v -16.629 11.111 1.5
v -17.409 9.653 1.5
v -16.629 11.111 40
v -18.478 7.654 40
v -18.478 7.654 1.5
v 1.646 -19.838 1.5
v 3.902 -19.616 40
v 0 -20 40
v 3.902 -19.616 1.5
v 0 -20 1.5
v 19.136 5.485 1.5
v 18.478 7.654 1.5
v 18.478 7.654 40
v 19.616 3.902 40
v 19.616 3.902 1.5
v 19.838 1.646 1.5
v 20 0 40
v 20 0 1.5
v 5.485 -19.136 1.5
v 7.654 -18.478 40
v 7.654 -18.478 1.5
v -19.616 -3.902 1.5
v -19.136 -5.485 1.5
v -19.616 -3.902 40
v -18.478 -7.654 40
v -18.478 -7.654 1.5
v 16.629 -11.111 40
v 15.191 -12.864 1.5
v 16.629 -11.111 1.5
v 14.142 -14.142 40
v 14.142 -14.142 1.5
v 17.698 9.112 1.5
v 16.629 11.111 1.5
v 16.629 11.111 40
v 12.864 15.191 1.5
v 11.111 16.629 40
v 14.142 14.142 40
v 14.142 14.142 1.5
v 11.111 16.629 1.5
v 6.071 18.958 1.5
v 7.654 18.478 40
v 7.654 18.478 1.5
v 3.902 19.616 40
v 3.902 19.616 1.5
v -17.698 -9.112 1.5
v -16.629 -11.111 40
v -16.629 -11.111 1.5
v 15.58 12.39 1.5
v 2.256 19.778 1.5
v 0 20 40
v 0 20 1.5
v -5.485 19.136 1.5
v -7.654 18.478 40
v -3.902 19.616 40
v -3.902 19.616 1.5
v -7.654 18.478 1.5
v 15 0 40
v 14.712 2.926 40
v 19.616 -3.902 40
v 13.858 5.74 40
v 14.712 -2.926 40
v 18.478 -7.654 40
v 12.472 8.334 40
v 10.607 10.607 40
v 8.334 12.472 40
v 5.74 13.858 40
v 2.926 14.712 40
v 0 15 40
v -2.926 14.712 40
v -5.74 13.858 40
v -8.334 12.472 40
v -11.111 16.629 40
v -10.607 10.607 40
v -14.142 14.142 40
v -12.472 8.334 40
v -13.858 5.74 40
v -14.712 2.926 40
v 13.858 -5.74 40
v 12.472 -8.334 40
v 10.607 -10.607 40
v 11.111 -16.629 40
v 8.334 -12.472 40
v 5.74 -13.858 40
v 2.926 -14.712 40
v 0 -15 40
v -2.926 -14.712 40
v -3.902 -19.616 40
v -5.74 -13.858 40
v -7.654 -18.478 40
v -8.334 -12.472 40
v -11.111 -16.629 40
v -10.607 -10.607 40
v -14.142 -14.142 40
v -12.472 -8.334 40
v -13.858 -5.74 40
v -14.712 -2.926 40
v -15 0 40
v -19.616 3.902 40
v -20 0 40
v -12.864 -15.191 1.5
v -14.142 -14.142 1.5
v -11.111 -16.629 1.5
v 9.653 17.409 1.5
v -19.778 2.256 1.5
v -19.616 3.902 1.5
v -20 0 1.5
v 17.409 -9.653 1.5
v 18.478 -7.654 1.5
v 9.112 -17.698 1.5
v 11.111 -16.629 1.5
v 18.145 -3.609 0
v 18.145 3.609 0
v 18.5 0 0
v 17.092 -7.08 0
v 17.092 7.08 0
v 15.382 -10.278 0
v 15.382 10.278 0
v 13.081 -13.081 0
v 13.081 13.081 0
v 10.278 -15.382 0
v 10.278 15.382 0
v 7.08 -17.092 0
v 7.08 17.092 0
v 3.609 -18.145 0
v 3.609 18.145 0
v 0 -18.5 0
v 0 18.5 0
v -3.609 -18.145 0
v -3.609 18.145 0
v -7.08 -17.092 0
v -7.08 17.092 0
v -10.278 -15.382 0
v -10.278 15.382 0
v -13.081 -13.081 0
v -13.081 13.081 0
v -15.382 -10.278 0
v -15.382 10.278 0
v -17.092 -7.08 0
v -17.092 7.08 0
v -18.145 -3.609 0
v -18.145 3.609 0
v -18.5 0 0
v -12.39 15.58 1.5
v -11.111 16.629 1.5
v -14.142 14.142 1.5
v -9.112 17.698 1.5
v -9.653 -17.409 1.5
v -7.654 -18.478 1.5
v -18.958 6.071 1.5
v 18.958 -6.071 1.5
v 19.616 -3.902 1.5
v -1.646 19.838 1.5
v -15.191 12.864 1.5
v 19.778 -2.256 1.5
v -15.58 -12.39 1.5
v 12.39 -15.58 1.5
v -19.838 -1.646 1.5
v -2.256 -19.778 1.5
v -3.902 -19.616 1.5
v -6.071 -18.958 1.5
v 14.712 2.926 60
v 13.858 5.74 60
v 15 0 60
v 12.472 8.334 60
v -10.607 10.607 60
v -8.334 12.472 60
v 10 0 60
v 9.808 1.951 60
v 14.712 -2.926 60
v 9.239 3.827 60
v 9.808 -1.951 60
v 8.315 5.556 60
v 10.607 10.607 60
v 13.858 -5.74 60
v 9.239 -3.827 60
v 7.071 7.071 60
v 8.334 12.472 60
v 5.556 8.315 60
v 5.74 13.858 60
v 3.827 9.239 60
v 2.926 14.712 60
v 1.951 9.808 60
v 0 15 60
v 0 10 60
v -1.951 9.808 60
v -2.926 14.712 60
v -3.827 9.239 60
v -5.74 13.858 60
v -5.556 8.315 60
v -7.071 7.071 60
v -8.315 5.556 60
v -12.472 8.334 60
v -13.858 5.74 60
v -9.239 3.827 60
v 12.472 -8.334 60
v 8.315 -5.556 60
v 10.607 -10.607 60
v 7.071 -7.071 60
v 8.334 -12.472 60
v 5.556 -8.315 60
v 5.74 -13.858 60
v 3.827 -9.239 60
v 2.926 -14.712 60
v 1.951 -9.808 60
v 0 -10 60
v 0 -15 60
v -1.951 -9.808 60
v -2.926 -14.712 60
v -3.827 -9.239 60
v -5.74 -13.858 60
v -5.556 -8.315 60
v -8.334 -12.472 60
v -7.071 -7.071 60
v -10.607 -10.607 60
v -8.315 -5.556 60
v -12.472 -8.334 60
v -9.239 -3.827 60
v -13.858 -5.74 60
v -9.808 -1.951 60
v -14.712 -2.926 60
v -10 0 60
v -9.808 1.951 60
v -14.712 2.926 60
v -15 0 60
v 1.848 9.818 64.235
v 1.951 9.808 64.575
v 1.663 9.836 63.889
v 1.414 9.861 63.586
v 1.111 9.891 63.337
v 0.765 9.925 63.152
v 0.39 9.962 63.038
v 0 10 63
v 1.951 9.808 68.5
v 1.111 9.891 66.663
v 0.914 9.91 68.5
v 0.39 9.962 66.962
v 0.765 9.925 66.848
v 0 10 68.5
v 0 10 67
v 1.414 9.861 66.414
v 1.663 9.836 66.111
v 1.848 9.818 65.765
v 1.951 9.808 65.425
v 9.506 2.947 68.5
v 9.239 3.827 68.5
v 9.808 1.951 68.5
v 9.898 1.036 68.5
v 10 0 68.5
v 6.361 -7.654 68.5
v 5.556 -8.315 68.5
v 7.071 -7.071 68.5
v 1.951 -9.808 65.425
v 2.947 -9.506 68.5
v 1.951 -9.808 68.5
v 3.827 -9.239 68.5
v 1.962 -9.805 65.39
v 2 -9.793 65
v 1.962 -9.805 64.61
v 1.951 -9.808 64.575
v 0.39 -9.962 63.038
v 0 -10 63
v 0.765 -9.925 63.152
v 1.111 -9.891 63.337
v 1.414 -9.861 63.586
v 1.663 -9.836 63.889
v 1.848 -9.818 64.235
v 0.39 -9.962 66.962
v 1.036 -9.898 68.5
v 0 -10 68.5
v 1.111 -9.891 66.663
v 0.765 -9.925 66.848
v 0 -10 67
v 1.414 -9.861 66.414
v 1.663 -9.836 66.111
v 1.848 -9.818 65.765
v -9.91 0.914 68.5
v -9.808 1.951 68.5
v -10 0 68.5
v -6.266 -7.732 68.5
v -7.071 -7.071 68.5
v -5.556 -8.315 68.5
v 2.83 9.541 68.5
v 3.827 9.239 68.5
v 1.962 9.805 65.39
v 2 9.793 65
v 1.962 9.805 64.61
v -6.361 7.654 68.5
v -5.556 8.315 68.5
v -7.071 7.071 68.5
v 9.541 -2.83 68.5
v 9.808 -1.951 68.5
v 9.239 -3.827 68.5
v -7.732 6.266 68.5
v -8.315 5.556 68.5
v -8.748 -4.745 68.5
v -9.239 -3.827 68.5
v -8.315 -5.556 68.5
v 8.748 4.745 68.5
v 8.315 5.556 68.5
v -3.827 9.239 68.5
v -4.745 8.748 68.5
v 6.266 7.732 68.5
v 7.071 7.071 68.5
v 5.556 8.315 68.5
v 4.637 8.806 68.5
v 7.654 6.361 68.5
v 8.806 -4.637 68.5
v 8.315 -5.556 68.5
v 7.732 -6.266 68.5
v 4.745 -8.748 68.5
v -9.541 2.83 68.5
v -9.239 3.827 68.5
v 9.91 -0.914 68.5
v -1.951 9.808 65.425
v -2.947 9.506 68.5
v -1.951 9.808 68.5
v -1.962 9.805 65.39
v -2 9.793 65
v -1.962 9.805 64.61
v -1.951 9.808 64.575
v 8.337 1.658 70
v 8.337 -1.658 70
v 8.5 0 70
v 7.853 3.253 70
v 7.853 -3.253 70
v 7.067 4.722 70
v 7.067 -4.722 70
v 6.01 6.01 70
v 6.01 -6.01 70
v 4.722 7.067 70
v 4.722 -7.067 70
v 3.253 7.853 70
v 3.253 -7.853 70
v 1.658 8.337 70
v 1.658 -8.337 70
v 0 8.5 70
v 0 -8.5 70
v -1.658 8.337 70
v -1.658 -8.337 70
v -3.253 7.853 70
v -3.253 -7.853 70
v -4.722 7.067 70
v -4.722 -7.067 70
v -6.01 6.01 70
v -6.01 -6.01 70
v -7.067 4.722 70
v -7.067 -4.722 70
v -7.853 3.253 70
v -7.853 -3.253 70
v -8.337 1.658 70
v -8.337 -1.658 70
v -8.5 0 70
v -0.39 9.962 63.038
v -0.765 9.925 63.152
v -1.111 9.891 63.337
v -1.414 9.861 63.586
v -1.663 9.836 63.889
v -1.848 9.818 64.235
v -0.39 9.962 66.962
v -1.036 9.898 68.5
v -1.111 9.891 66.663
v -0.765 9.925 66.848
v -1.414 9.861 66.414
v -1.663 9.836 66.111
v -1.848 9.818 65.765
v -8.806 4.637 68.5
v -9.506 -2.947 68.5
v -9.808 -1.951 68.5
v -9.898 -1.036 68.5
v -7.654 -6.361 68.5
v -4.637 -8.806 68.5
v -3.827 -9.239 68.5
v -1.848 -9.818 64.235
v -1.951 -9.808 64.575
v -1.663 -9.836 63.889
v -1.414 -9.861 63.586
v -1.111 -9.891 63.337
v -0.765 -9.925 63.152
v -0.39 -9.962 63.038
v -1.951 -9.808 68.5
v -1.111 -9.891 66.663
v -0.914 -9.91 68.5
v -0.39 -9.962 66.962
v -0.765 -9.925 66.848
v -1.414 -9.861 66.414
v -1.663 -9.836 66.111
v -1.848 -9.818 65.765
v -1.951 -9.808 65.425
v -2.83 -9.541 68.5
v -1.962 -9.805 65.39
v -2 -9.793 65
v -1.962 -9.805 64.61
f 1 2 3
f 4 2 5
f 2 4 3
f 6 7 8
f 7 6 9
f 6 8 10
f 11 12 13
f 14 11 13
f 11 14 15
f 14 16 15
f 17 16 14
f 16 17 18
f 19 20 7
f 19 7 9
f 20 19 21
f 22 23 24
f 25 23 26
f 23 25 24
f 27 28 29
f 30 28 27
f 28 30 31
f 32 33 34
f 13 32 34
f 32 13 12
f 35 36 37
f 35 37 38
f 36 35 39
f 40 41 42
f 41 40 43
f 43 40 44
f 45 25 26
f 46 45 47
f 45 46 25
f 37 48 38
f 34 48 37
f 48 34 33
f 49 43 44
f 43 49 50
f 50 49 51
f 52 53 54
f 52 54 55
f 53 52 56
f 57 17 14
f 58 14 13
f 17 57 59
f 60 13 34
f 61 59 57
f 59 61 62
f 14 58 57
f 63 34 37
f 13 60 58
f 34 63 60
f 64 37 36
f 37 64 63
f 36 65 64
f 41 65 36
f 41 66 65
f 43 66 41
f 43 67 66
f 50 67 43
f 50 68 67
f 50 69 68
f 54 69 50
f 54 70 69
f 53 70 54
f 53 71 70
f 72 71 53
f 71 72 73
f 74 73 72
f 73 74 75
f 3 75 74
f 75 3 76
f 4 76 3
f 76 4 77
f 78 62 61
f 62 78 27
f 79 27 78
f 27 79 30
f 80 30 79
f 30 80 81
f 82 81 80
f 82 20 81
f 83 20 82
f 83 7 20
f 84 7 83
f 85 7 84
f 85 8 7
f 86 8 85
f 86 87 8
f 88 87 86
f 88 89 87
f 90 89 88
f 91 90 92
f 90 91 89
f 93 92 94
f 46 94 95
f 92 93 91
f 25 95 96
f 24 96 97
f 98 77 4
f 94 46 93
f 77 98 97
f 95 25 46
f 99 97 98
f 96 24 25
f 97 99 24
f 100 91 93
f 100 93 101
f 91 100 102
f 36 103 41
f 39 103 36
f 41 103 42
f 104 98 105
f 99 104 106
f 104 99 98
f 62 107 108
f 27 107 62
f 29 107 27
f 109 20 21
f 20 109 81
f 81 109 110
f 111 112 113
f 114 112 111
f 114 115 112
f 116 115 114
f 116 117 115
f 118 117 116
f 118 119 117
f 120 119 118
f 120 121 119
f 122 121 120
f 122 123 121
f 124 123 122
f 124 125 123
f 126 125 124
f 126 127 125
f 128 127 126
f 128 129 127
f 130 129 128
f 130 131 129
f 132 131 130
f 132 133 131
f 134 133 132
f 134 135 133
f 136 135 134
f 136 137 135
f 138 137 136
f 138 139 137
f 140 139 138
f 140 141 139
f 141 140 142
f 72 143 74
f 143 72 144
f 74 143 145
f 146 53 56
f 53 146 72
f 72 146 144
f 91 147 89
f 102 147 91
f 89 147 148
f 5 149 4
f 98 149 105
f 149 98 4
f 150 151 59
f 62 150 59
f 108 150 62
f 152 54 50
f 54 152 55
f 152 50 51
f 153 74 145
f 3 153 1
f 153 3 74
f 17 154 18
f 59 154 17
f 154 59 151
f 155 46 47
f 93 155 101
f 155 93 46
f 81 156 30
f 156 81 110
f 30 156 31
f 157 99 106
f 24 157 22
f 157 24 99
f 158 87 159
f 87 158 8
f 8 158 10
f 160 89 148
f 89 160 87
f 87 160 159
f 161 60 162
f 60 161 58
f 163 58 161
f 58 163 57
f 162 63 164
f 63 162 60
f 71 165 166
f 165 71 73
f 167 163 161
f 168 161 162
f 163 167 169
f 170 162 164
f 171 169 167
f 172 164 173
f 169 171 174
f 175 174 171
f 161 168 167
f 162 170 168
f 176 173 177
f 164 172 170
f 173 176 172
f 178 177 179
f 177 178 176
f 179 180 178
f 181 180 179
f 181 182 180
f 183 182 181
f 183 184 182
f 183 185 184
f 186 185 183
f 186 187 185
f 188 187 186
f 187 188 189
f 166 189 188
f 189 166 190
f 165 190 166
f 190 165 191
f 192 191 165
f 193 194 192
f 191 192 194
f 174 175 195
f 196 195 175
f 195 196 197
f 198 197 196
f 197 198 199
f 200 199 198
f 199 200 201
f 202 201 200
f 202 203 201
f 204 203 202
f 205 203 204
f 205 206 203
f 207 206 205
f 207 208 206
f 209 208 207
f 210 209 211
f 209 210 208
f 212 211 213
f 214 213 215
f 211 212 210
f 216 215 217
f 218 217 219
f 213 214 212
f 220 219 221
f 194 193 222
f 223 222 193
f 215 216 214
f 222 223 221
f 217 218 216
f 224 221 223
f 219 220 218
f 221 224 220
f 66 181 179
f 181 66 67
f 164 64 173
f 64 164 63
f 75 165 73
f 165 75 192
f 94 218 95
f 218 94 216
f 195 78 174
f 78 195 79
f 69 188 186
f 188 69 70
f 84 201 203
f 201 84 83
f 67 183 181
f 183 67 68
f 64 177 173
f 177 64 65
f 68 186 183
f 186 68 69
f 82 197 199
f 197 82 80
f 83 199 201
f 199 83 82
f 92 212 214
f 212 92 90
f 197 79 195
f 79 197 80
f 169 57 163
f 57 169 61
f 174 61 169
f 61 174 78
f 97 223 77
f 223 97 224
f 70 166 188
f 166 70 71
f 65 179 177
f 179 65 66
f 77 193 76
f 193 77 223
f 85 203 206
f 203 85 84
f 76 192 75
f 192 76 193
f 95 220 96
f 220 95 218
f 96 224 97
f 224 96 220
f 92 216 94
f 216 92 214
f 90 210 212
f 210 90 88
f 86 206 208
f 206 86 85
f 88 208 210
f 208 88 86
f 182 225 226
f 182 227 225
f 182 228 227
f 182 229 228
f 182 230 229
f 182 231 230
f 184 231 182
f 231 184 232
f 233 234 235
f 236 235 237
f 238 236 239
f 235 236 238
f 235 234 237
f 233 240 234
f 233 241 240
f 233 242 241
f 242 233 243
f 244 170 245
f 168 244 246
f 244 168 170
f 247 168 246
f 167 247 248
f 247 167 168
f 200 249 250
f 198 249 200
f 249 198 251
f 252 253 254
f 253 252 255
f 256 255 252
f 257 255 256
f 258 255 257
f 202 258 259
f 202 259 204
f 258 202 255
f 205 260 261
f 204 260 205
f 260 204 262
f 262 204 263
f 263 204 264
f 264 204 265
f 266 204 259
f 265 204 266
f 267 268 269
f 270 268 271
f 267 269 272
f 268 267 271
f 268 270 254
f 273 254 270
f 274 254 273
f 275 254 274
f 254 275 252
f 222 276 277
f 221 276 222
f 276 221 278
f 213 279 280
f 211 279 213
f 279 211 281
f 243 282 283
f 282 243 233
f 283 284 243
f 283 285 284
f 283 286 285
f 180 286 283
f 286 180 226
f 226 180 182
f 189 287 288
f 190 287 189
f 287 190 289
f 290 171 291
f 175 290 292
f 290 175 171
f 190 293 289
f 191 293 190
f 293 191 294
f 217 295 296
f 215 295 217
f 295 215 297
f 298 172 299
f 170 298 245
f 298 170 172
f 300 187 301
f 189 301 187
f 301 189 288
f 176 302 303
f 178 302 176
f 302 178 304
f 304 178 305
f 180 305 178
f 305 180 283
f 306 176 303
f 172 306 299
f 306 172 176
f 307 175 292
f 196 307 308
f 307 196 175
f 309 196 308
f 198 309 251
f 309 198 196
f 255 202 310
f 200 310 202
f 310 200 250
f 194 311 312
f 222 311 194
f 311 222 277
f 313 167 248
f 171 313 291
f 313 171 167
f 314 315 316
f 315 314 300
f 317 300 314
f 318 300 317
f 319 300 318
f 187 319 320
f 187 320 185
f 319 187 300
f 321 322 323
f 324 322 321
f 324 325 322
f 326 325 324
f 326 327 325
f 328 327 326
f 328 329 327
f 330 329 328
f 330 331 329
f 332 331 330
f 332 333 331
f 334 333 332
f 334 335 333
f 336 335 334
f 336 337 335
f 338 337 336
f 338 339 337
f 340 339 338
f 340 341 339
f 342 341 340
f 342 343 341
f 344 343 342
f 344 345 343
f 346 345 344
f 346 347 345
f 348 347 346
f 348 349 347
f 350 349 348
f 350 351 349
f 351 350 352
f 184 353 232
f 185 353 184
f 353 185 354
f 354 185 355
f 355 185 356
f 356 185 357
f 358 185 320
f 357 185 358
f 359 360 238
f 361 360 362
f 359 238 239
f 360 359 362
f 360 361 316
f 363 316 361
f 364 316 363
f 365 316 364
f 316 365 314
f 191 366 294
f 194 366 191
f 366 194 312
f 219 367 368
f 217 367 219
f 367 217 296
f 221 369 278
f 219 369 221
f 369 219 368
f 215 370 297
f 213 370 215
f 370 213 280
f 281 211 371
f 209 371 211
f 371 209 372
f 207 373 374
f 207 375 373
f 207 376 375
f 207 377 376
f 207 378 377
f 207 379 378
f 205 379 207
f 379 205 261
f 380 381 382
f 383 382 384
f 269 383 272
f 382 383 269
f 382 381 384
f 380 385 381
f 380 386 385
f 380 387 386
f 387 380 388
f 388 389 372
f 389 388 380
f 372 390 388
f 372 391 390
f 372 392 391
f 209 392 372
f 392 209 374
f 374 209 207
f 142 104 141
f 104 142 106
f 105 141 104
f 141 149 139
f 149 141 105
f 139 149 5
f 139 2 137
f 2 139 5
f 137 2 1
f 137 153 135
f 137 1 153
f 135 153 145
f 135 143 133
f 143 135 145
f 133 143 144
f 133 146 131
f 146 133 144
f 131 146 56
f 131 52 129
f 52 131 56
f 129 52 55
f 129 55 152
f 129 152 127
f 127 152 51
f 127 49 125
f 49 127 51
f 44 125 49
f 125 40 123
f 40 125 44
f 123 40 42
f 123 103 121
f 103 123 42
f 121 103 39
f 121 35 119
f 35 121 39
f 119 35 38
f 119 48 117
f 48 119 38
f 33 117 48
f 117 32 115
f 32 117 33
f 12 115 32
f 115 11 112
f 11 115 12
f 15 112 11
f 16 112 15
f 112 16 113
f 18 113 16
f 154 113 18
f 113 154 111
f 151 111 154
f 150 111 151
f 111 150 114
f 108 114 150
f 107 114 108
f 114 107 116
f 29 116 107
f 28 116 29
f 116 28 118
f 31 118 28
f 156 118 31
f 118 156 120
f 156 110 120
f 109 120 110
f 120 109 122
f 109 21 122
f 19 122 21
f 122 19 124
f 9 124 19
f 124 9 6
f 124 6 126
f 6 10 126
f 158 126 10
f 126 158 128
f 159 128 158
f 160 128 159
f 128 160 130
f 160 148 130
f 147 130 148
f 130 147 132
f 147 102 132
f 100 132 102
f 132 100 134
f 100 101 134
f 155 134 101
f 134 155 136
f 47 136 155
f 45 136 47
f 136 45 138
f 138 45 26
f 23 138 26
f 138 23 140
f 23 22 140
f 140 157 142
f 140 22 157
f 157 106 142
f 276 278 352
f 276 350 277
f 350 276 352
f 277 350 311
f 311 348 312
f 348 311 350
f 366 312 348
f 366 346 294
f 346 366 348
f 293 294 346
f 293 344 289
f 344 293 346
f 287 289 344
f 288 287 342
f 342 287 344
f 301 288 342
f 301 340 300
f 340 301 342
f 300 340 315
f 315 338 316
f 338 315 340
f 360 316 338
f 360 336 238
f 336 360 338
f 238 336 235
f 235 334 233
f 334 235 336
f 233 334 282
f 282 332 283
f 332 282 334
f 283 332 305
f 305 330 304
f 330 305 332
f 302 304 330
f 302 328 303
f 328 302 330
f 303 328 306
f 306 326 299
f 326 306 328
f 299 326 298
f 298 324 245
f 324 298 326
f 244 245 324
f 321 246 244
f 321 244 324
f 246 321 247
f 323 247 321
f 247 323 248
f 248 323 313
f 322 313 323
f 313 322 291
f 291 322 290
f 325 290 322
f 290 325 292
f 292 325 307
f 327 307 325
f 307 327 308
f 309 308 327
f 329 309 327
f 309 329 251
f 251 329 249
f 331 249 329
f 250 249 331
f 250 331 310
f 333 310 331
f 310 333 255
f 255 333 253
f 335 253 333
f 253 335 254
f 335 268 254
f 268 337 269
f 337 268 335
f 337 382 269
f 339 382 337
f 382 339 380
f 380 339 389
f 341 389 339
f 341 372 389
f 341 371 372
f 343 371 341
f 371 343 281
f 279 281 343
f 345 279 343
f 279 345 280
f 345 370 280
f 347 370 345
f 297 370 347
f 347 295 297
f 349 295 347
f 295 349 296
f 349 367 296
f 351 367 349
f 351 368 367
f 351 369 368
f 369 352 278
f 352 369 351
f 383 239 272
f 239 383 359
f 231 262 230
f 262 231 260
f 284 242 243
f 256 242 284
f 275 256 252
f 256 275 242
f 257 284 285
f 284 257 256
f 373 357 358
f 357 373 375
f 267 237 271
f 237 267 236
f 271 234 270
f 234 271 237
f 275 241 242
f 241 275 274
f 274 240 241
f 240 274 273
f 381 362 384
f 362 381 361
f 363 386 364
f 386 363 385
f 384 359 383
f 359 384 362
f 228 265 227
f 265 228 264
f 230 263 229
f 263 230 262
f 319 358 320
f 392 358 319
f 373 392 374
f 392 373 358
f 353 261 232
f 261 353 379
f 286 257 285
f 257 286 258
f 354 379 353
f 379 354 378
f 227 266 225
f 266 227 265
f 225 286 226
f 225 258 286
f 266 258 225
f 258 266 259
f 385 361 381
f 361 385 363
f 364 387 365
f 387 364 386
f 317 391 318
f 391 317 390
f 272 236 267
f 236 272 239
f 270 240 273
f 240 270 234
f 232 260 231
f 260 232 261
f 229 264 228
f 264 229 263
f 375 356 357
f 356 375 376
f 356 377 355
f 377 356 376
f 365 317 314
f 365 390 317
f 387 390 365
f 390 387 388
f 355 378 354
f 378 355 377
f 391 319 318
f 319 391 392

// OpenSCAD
$fn = 32;

// ----------------------------------------------------------------------
// Stepped shaft: diameters 40, 30, 20 mm, 70 mm long
// ----------------------------------------------------------------------

// --- parameters (mm) ---
d1 = 40;                  // step 1 diameter
len1 = 40;                // step 1 length
d2 = 30;                  // step 2 diameter
len2 = 20;                // step 2 length
d3 = 20;                  // step 3 diameter
len3 = 10;                // step 3 length
total = 70;               // overall length
chamfer = 1.5;            // end chamfer
cross_d = 4;              // cross pin hole
cross_z = 65;             // cross hole position

difference() {
  /* turned body: stacked cylinders, every step sunk into the bigger one */
  union() {
    cylinder(h = len1, d = d1);
    translate([0, 0, 39.6]) cylinder(h = 20.4, d = d2);
    translate([0, 0, 59.6]) cylinder(h = 10.4, d = d3);
  }
  /* bottom chamfer ring cut */
  rotate_extrude() translate([18.5, -2.5]) polygon([[0, 0], [4, 0], [4, 6.5], [0, 2.5]]);
  /* top chamfer ring cut */
  rotate_extrude() translate([8.5, 70]) polygon([[0, 0], [4, -4], [4, 2.5], [0, 2.5]]);
  /* cross pin hole through the small step */
  translate([0, 0, cross_z]) rotate([90, 0, 0]) cylinder(h = d3 + 5, d = cross_d, center = true);
}
